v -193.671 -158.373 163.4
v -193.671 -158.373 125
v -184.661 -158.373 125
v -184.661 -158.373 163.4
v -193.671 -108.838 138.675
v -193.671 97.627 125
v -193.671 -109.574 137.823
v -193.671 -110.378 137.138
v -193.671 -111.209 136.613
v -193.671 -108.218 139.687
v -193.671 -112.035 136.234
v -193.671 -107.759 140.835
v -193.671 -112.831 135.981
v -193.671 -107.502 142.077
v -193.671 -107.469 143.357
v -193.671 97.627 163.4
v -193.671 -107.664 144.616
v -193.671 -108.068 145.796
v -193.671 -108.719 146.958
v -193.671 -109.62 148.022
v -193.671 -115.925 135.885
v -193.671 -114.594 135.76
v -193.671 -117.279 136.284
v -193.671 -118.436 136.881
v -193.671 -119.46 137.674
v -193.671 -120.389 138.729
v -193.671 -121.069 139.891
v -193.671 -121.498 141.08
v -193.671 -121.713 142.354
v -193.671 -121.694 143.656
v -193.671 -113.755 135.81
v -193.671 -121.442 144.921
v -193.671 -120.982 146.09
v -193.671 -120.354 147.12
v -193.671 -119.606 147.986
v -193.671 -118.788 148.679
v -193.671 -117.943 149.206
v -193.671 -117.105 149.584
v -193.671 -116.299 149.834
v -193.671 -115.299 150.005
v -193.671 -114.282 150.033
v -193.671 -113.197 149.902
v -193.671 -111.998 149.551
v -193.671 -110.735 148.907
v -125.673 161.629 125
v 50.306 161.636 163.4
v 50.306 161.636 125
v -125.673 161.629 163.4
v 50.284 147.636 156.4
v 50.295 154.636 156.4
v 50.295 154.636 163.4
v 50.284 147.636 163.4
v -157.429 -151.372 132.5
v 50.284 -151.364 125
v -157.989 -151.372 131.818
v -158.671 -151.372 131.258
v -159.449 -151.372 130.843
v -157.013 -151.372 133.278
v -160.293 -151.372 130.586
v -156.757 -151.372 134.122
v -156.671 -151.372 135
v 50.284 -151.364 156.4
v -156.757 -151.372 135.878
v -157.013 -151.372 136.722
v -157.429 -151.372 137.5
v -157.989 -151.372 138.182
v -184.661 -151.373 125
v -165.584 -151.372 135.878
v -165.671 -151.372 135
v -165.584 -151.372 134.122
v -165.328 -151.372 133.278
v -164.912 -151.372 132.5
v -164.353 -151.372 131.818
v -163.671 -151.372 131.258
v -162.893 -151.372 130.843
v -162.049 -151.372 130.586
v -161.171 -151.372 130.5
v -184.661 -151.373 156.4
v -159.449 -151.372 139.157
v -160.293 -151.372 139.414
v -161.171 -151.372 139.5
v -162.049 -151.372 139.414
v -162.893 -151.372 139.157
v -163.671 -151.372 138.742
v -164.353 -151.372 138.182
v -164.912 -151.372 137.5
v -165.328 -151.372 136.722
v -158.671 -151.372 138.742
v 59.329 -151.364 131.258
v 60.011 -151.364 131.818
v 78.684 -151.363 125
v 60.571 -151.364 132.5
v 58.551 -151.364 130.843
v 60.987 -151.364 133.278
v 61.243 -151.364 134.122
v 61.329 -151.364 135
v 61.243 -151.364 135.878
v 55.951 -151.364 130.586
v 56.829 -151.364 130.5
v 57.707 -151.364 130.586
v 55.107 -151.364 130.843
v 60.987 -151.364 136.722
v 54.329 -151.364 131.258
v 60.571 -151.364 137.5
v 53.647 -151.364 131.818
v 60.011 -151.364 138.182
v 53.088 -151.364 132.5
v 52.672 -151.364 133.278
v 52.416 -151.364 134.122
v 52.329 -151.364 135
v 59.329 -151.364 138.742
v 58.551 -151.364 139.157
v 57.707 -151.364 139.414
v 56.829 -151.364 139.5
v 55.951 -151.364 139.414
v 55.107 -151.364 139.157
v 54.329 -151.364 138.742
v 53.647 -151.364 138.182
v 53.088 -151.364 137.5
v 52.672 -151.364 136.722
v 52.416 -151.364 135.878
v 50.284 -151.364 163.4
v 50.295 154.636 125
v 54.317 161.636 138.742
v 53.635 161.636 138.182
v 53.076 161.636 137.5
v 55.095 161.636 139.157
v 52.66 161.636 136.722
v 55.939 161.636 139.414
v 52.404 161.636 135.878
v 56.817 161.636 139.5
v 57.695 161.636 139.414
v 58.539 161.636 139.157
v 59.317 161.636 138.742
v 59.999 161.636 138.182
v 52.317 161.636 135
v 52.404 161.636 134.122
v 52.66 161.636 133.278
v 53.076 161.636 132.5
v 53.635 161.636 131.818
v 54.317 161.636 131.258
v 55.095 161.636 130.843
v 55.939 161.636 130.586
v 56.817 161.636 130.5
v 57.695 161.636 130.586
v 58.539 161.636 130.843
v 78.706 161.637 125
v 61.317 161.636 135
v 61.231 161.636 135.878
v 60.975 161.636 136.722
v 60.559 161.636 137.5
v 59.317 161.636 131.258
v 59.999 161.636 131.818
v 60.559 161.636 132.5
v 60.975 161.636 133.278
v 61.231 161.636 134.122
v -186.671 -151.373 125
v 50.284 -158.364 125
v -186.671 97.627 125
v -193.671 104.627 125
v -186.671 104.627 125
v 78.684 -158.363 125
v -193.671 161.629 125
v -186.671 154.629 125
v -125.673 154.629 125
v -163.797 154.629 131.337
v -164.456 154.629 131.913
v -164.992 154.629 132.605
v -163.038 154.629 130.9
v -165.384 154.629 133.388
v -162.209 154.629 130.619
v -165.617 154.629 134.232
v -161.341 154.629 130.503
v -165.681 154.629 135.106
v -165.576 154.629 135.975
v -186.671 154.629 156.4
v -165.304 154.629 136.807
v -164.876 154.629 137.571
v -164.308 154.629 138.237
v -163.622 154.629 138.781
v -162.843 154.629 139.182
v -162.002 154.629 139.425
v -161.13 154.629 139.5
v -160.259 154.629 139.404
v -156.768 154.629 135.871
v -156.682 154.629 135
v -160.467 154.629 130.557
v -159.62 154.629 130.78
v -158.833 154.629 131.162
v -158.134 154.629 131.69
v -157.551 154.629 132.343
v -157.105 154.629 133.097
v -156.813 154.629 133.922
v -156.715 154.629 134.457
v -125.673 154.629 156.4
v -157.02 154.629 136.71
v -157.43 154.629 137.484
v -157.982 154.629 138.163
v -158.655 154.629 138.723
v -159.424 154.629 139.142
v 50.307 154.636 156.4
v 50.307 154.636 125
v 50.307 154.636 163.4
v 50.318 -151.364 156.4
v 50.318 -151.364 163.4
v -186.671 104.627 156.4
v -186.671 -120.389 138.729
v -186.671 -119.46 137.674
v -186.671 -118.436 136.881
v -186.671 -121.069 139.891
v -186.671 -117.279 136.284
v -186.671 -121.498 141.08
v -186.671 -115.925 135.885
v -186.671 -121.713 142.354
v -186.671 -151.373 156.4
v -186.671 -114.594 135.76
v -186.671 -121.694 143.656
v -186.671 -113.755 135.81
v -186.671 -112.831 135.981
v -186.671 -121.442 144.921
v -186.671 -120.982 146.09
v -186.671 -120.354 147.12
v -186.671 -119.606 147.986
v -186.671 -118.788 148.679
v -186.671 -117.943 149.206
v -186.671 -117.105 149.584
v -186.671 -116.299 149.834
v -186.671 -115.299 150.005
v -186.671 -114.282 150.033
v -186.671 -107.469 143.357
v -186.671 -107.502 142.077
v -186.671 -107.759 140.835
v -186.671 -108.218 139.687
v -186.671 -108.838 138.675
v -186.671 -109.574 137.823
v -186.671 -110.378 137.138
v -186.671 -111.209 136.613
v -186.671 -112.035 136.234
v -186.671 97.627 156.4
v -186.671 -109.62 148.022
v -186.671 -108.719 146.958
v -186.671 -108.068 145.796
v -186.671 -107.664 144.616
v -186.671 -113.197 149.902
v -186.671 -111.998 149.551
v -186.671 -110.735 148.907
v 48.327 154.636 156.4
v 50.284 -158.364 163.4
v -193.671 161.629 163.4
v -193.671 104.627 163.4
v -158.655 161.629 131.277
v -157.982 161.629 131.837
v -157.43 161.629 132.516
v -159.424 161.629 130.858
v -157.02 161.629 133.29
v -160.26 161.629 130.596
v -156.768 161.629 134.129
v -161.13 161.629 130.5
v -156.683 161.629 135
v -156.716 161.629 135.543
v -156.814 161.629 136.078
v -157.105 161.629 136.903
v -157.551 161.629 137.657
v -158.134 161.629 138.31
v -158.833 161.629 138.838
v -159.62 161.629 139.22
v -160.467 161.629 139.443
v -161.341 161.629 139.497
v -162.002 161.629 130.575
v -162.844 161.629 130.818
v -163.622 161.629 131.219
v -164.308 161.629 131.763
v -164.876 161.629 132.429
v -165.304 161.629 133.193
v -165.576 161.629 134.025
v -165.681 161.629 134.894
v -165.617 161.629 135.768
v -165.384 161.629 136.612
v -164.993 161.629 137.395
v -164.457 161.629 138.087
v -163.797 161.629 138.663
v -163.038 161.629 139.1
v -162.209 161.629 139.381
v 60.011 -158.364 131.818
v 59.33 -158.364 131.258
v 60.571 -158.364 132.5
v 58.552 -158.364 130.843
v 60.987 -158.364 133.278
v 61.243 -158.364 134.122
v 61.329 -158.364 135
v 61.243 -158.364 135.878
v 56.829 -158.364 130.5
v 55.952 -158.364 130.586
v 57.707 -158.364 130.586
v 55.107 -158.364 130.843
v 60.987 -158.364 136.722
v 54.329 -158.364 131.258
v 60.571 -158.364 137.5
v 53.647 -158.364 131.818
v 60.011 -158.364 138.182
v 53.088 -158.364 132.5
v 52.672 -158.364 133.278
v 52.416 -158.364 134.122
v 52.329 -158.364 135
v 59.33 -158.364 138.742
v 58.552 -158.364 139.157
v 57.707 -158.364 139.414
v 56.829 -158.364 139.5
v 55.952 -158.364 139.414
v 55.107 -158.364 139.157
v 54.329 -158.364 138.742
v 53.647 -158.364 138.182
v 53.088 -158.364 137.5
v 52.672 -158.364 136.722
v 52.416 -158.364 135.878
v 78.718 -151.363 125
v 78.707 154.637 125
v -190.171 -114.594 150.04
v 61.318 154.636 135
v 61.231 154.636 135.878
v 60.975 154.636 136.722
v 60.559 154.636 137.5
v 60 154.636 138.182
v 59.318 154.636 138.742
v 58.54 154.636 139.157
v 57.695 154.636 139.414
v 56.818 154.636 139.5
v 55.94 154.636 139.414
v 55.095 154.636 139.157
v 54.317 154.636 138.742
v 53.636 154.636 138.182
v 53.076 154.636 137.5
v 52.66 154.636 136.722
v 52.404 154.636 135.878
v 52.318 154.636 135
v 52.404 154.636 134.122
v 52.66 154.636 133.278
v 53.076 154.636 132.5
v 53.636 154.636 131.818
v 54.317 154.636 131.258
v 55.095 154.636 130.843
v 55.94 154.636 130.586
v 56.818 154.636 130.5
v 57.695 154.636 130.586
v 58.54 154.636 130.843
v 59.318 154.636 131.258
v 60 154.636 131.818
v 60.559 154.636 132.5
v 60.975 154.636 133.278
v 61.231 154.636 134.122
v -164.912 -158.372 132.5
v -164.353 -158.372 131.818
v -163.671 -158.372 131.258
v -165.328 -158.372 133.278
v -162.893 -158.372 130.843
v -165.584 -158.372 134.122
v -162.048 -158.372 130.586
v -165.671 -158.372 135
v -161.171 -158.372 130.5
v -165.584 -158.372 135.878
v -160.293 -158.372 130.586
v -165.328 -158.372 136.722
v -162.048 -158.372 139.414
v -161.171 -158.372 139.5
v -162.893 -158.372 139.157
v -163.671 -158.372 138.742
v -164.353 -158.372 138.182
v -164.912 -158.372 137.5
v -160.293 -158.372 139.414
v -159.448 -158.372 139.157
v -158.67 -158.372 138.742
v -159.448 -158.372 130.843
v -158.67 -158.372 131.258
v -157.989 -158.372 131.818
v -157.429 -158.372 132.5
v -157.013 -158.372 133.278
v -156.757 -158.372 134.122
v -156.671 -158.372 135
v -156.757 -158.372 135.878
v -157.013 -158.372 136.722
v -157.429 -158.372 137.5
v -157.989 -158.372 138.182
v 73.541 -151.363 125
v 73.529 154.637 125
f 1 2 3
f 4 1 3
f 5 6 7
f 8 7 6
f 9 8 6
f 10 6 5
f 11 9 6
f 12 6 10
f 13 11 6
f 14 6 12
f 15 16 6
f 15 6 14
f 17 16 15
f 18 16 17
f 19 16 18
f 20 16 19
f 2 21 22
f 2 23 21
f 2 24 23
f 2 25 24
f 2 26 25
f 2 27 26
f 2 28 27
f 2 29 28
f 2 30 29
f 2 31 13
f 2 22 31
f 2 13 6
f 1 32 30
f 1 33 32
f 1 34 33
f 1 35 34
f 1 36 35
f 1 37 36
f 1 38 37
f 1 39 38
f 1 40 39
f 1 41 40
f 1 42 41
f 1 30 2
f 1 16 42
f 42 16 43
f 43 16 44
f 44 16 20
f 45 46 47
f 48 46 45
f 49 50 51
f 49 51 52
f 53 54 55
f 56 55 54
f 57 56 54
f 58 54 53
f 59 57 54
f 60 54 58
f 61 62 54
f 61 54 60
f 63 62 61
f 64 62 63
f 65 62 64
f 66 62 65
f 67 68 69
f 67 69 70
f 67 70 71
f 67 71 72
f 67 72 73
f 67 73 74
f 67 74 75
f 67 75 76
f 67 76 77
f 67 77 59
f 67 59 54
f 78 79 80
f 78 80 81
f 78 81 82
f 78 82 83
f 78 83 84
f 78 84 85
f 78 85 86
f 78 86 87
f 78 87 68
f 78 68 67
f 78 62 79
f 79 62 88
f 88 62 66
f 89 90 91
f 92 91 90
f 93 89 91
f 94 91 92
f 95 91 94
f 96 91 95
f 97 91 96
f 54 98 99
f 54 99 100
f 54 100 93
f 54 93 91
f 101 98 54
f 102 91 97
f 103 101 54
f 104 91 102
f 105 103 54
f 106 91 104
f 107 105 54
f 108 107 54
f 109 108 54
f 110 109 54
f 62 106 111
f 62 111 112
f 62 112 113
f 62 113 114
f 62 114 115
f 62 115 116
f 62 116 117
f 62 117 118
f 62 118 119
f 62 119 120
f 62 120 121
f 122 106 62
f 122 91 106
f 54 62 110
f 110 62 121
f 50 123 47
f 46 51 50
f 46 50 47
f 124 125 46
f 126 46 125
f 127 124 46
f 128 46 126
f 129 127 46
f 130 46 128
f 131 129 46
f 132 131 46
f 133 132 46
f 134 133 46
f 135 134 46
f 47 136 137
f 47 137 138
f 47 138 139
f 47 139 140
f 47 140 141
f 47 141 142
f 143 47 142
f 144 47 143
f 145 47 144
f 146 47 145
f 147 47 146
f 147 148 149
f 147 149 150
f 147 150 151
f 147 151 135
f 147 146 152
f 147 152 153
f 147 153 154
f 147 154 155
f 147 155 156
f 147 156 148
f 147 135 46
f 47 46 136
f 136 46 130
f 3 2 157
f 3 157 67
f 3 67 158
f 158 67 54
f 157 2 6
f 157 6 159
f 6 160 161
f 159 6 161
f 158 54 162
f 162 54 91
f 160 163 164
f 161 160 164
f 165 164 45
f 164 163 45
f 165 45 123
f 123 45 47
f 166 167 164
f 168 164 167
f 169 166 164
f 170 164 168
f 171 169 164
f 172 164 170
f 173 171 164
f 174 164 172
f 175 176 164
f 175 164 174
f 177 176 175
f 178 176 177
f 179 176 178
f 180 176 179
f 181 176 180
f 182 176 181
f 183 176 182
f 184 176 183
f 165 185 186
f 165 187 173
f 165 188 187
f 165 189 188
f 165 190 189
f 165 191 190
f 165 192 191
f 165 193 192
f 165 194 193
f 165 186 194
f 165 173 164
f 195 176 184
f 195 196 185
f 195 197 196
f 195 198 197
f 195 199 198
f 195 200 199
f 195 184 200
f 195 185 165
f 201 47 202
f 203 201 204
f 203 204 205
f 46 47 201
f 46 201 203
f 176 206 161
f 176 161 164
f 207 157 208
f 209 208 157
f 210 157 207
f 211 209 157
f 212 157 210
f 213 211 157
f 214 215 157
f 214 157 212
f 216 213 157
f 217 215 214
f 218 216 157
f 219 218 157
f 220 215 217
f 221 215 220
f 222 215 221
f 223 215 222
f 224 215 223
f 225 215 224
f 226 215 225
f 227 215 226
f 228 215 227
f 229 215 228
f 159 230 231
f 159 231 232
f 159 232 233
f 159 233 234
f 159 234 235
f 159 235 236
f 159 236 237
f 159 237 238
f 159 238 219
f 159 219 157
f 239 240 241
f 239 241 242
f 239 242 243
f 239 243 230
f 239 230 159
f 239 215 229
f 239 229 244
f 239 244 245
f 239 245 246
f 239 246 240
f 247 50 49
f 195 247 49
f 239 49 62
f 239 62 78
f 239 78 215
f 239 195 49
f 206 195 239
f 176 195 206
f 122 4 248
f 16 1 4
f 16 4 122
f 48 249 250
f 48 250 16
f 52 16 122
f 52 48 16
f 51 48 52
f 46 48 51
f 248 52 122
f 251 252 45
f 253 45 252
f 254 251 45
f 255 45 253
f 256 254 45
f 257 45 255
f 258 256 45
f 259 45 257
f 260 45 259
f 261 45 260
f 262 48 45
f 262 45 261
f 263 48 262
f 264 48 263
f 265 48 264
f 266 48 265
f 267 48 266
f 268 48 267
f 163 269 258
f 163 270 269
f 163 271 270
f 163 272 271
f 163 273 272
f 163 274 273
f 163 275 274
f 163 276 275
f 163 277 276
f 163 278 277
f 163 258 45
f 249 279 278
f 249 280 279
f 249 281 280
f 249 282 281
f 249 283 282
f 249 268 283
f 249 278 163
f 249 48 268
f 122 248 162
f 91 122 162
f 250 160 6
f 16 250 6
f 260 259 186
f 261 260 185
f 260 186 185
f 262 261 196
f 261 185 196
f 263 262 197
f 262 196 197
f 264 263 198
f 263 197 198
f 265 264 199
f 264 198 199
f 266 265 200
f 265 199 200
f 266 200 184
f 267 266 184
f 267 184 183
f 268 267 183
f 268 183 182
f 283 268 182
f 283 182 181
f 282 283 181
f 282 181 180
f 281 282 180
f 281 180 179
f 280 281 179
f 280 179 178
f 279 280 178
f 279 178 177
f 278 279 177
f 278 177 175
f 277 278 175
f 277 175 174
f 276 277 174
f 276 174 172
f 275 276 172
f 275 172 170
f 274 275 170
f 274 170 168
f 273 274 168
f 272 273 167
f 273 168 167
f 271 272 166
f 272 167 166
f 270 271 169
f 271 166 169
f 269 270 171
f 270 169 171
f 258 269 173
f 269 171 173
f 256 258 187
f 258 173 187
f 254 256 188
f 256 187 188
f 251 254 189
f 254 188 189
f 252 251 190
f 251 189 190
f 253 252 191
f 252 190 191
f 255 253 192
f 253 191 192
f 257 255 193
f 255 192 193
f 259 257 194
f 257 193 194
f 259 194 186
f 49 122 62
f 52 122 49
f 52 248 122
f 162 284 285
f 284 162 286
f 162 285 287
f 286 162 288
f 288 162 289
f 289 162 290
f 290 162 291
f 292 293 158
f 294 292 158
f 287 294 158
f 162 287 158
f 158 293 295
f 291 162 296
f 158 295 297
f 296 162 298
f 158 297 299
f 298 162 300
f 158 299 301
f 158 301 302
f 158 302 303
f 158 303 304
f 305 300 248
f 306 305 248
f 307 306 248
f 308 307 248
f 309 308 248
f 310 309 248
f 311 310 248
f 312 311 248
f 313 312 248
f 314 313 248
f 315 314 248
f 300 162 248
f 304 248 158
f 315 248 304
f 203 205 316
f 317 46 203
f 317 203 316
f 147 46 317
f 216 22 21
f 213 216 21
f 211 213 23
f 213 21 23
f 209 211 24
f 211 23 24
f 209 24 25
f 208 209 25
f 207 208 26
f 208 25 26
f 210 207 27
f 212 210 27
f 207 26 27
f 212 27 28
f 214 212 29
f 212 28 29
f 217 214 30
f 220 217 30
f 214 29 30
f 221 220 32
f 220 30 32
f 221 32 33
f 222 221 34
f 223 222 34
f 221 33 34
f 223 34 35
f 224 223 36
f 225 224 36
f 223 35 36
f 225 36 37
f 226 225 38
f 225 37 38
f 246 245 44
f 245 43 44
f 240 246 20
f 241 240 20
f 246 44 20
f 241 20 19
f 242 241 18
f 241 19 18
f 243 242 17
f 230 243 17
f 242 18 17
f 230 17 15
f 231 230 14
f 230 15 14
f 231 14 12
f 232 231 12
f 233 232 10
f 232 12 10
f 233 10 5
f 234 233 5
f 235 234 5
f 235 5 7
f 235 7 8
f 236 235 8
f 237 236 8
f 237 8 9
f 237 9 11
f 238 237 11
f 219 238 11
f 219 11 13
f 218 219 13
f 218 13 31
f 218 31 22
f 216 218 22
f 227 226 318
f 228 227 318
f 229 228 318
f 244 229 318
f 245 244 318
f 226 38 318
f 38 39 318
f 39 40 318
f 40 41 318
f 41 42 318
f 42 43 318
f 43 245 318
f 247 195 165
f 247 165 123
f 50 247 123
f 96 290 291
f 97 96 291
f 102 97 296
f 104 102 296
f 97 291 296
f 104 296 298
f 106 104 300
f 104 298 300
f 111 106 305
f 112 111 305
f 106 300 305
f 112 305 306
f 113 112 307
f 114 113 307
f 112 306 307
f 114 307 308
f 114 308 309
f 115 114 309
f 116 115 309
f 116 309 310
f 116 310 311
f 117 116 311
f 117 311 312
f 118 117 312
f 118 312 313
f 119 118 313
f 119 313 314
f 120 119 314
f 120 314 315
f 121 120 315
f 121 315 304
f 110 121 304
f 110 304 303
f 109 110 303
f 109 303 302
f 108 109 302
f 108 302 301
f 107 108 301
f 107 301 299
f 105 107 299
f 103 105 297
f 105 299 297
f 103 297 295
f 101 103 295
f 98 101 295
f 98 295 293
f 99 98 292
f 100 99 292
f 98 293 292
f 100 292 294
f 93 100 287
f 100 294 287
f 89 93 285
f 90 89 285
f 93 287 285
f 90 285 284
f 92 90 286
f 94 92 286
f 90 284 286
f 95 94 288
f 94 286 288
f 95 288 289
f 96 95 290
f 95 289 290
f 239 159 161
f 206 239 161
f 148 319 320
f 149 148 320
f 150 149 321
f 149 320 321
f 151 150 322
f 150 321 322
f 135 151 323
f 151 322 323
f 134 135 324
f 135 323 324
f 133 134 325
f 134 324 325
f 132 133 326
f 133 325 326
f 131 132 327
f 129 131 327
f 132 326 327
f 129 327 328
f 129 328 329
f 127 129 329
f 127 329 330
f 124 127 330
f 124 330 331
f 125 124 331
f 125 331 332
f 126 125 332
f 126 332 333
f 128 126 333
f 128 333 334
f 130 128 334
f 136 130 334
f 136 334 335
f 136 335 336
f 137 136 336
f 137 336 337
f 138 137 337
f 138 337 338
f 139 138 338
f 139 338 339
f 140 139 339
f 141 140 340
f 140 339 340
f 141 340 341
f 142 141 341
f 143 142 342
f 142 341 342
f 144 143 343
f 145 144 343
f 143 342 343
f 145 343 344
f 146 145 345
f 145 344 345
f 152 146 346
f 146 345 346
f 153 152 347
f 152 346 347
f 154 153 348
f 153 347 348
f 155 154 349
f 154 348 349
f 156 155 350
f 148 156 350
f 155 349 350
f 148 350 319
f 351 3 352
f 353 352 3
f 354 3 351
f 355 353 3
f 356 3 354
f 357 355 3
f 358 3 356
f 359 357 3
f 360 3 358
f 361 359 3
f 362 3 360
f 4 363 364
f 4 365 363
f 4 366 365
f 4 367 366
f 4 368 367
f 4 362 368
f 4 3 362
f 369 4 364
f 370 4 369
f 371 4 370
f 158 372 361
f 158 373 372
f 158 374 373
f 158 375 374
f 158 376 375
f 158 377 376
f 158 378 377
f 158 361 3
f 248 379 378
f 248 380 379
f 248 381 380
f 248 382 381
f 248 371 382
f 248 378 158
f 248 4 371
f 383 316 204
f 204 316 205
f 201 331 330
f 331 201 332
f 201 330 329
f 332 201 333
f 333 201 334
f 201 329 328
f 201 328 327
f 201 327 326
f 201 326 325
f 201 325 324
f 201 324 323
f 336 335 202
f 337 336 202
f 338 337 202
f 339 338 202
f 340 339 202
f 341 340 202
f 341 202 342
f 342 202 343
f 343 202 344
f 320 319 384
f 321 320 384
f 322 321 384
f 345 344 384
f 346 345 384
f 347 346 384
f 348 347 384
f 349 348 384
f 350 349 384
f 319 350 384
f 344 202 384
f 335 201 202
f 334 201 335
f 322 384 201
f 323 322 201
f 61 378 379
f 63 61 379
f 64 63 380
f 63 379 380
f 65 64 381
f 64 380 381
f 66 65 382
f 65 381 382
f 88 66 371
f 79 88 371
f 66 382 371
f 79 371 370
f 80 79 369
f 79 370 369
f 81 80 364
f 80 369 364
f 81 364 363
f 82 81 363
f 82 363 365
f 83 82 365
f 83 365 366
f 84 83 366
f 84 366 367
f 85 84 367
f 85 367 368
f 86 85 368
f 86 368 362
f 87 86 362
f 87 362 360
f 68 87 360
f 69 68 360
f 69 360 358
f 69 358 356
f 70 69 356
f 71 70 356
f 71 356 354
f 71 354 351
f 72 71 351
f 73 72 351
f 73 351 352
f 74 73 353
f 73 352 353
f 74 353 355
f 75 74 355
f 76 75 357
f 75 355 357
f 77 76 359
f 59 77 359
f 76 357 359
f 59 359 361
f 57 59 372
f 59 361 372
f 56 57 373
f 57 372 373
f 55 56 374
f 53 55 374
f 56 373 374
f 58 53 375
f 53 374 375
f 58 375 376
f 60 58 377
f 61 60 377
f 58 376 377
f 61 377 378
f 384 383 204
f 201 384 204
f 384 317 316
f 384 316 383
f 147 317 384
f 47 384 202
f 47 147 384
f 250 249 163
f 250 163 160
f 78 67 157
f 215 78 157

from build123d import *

# Parameters (mm, degrees)
BOSS_EXTRUDE1_DEPTH  = 7
BOSS_EXTRUDE2_DEPTH  = 38.4
BOSS_EXTRUDE3_DEPTH  = 7
BOSS_EXTRUDE4_DEPTH  = 7
BOSS_EXTRUDE13_DEPTH = 306
CUT_EXTRUDE1_DEPTH   = 7
SKETCH7_R            = 4.5
CUT_EXTRUDE2_DEPTH   = 321.010371483


with BuildPart() as part:
    # Sketch1 → Boss-Extrude1 (new body)
    with BuildSketch(Plane.XY.offset(156.4)):
        Polygon((-125.672708569, 154.629250989), (48.327291305, 154.635876502), (50.295177711, 154.635951434), (50.284067725, 147.635951006), (50.284067725, -151.364049211), (-184.661056762, -151.372995372), (-186.670538102, -151.372995372), (-186.670538102, 97.627040708), (-186.670804646, 104.627040714), (-186.670804646, 154.629250989), align=None)
    extrude(amount=BOSS_EXTRUDE1_DEPTH)

    # Sketch2 → Boss-Extrude2 (add)
    with BuildSketch(Plane.XY.offset(163.4)):
        Polygon((-125.67284184, 161.629250989), (-193.670804646, 161.629250989), (-193.670804646, 104.626907443), (-193.670538102, 97.626907437), (-193.670538102, -158.372995372), (-184.660923425, -158.372995372), (50.284067725, -158.364049216), (50.284067725, -151.364049211), (-184.661056762, -151.372995372), (-186.670538102, -151.372995372), (-186.670538102, 97.627040708), (-186.670804646, 104.627040714), (-186.670804646, 154.629250989), (-125.672708569, 154.629250989), (50.295177711, 154.635951434), (50.306287696, 161.635951862), align=None)
    extrude(amount=-BOSS_EXTRUDE2_DEPTH)

    # Sketch4 → Boss-Extrude4 (add)
    with BuildSketch(Plane(origin=(0.006030205, -158.365963686, 0), x_dir=(0.999999999, 3.8078e-05, 0), z_dir=(3.8078e-05, -0.999999999, 0))):
        Polygon((50.278037556, 125), (50.278037556, 163.4), (78.678037556, 125), align=None)
    extrude(amount=-BOSS_EXTRUDE4_DEPTH)

    # Sketch6 → Cut-Extrude1 (cut)
    with BuildSketch(Plane.ZY.offset(193.670538102)):
        with BuildLine():
            add(Edge.make_bspline(
                [(135.76, -114.594279246), (135.76, -128.874279236), (150.04, -128.874279236), (150.04, -114.594279246), (150.04, -100.314279257), (135.76, -100.314279257), (135.76, -114.594279246)],
                knots=[0, 0, 0, 0, 0.5, 0.5, 0.5, 1, 1, 1, 1], degree=3, weights=[1, 0.333333333, 0.333333333, 1, 0.333333333, 0.333333333, 1]))
        make_face()
    extrude(amount=-CUT_EXTRUDE1_DEPTH, mode=Mode.SUBTRACT)


with BuildPart() as body_2:
    # Sketch3 → Boss-Extrude3 (new body)
    with BuildSketch(Plane(origin=(-0.006154646, 161.634036082, 0), x_dir=(0.999999999, 3.8078e-05, 0), z_dir=(-3.8078e-05, 0.999999999, 0))):
        Polygon((50.312442379, -125), (50.312442379, -163.4), (78.712442379, -125), align=None)
    extrude(amount=-BOSS_EXTRUDE3_DEPTH)

    # Sketch5 → Boss-Extrude13 (add)
    with BuildSketch(Plane(origin=(-0.005888102, 154.634036087, 0), x_dir=(0.999999999, 3.8078e-05, 0), z_dir=(3.8078e-05, -0.999999999, 0))):
        Polygon((50.312442379, 163.4), (78.712442379, 125), (73.535352208, 125), (50.312442379, 156.399990755), align=None)
    extrude(amount=BOSS_EXTRUDE13_DEPTH)


with BuildPart() as cut_extrude2_tool:
    # Sketch7 → Cut-Extrude2 (new body, through all)
    with BuildSketch(Plane(origin=(0.006030205, -158.365963686, 0), x_dir=(0.999999999, 3.8078e-05, 0), z_dir=(3.8078e-05, -0.999999999, 0))):
        with Locations((-161.176568435, 135)):
            Circle(SKETCH7_R)
        with Locations((56.823431565, 135)):
            Circle(SKETCH7_R)
    extrude(amount=-CUT_EXTRUDE2_DEPTH)


with BuildPart() as part_1:
    add(part.part)

    # Cut-Extrude2: cut by cut_extrude2_tool
    add(cut_extrude2_tool.part, mode=Mode.SUBTRACT)


with BuildPart() as body_2_1:
    add(body_2.part)

    # Cut-Extrude2: cut by cut_extrude2_tool
    add(cut_extrude2_tool.part, mode=Mode.SUBTRACT)


solid = Compound([part_1.part, body_2_1.part])
